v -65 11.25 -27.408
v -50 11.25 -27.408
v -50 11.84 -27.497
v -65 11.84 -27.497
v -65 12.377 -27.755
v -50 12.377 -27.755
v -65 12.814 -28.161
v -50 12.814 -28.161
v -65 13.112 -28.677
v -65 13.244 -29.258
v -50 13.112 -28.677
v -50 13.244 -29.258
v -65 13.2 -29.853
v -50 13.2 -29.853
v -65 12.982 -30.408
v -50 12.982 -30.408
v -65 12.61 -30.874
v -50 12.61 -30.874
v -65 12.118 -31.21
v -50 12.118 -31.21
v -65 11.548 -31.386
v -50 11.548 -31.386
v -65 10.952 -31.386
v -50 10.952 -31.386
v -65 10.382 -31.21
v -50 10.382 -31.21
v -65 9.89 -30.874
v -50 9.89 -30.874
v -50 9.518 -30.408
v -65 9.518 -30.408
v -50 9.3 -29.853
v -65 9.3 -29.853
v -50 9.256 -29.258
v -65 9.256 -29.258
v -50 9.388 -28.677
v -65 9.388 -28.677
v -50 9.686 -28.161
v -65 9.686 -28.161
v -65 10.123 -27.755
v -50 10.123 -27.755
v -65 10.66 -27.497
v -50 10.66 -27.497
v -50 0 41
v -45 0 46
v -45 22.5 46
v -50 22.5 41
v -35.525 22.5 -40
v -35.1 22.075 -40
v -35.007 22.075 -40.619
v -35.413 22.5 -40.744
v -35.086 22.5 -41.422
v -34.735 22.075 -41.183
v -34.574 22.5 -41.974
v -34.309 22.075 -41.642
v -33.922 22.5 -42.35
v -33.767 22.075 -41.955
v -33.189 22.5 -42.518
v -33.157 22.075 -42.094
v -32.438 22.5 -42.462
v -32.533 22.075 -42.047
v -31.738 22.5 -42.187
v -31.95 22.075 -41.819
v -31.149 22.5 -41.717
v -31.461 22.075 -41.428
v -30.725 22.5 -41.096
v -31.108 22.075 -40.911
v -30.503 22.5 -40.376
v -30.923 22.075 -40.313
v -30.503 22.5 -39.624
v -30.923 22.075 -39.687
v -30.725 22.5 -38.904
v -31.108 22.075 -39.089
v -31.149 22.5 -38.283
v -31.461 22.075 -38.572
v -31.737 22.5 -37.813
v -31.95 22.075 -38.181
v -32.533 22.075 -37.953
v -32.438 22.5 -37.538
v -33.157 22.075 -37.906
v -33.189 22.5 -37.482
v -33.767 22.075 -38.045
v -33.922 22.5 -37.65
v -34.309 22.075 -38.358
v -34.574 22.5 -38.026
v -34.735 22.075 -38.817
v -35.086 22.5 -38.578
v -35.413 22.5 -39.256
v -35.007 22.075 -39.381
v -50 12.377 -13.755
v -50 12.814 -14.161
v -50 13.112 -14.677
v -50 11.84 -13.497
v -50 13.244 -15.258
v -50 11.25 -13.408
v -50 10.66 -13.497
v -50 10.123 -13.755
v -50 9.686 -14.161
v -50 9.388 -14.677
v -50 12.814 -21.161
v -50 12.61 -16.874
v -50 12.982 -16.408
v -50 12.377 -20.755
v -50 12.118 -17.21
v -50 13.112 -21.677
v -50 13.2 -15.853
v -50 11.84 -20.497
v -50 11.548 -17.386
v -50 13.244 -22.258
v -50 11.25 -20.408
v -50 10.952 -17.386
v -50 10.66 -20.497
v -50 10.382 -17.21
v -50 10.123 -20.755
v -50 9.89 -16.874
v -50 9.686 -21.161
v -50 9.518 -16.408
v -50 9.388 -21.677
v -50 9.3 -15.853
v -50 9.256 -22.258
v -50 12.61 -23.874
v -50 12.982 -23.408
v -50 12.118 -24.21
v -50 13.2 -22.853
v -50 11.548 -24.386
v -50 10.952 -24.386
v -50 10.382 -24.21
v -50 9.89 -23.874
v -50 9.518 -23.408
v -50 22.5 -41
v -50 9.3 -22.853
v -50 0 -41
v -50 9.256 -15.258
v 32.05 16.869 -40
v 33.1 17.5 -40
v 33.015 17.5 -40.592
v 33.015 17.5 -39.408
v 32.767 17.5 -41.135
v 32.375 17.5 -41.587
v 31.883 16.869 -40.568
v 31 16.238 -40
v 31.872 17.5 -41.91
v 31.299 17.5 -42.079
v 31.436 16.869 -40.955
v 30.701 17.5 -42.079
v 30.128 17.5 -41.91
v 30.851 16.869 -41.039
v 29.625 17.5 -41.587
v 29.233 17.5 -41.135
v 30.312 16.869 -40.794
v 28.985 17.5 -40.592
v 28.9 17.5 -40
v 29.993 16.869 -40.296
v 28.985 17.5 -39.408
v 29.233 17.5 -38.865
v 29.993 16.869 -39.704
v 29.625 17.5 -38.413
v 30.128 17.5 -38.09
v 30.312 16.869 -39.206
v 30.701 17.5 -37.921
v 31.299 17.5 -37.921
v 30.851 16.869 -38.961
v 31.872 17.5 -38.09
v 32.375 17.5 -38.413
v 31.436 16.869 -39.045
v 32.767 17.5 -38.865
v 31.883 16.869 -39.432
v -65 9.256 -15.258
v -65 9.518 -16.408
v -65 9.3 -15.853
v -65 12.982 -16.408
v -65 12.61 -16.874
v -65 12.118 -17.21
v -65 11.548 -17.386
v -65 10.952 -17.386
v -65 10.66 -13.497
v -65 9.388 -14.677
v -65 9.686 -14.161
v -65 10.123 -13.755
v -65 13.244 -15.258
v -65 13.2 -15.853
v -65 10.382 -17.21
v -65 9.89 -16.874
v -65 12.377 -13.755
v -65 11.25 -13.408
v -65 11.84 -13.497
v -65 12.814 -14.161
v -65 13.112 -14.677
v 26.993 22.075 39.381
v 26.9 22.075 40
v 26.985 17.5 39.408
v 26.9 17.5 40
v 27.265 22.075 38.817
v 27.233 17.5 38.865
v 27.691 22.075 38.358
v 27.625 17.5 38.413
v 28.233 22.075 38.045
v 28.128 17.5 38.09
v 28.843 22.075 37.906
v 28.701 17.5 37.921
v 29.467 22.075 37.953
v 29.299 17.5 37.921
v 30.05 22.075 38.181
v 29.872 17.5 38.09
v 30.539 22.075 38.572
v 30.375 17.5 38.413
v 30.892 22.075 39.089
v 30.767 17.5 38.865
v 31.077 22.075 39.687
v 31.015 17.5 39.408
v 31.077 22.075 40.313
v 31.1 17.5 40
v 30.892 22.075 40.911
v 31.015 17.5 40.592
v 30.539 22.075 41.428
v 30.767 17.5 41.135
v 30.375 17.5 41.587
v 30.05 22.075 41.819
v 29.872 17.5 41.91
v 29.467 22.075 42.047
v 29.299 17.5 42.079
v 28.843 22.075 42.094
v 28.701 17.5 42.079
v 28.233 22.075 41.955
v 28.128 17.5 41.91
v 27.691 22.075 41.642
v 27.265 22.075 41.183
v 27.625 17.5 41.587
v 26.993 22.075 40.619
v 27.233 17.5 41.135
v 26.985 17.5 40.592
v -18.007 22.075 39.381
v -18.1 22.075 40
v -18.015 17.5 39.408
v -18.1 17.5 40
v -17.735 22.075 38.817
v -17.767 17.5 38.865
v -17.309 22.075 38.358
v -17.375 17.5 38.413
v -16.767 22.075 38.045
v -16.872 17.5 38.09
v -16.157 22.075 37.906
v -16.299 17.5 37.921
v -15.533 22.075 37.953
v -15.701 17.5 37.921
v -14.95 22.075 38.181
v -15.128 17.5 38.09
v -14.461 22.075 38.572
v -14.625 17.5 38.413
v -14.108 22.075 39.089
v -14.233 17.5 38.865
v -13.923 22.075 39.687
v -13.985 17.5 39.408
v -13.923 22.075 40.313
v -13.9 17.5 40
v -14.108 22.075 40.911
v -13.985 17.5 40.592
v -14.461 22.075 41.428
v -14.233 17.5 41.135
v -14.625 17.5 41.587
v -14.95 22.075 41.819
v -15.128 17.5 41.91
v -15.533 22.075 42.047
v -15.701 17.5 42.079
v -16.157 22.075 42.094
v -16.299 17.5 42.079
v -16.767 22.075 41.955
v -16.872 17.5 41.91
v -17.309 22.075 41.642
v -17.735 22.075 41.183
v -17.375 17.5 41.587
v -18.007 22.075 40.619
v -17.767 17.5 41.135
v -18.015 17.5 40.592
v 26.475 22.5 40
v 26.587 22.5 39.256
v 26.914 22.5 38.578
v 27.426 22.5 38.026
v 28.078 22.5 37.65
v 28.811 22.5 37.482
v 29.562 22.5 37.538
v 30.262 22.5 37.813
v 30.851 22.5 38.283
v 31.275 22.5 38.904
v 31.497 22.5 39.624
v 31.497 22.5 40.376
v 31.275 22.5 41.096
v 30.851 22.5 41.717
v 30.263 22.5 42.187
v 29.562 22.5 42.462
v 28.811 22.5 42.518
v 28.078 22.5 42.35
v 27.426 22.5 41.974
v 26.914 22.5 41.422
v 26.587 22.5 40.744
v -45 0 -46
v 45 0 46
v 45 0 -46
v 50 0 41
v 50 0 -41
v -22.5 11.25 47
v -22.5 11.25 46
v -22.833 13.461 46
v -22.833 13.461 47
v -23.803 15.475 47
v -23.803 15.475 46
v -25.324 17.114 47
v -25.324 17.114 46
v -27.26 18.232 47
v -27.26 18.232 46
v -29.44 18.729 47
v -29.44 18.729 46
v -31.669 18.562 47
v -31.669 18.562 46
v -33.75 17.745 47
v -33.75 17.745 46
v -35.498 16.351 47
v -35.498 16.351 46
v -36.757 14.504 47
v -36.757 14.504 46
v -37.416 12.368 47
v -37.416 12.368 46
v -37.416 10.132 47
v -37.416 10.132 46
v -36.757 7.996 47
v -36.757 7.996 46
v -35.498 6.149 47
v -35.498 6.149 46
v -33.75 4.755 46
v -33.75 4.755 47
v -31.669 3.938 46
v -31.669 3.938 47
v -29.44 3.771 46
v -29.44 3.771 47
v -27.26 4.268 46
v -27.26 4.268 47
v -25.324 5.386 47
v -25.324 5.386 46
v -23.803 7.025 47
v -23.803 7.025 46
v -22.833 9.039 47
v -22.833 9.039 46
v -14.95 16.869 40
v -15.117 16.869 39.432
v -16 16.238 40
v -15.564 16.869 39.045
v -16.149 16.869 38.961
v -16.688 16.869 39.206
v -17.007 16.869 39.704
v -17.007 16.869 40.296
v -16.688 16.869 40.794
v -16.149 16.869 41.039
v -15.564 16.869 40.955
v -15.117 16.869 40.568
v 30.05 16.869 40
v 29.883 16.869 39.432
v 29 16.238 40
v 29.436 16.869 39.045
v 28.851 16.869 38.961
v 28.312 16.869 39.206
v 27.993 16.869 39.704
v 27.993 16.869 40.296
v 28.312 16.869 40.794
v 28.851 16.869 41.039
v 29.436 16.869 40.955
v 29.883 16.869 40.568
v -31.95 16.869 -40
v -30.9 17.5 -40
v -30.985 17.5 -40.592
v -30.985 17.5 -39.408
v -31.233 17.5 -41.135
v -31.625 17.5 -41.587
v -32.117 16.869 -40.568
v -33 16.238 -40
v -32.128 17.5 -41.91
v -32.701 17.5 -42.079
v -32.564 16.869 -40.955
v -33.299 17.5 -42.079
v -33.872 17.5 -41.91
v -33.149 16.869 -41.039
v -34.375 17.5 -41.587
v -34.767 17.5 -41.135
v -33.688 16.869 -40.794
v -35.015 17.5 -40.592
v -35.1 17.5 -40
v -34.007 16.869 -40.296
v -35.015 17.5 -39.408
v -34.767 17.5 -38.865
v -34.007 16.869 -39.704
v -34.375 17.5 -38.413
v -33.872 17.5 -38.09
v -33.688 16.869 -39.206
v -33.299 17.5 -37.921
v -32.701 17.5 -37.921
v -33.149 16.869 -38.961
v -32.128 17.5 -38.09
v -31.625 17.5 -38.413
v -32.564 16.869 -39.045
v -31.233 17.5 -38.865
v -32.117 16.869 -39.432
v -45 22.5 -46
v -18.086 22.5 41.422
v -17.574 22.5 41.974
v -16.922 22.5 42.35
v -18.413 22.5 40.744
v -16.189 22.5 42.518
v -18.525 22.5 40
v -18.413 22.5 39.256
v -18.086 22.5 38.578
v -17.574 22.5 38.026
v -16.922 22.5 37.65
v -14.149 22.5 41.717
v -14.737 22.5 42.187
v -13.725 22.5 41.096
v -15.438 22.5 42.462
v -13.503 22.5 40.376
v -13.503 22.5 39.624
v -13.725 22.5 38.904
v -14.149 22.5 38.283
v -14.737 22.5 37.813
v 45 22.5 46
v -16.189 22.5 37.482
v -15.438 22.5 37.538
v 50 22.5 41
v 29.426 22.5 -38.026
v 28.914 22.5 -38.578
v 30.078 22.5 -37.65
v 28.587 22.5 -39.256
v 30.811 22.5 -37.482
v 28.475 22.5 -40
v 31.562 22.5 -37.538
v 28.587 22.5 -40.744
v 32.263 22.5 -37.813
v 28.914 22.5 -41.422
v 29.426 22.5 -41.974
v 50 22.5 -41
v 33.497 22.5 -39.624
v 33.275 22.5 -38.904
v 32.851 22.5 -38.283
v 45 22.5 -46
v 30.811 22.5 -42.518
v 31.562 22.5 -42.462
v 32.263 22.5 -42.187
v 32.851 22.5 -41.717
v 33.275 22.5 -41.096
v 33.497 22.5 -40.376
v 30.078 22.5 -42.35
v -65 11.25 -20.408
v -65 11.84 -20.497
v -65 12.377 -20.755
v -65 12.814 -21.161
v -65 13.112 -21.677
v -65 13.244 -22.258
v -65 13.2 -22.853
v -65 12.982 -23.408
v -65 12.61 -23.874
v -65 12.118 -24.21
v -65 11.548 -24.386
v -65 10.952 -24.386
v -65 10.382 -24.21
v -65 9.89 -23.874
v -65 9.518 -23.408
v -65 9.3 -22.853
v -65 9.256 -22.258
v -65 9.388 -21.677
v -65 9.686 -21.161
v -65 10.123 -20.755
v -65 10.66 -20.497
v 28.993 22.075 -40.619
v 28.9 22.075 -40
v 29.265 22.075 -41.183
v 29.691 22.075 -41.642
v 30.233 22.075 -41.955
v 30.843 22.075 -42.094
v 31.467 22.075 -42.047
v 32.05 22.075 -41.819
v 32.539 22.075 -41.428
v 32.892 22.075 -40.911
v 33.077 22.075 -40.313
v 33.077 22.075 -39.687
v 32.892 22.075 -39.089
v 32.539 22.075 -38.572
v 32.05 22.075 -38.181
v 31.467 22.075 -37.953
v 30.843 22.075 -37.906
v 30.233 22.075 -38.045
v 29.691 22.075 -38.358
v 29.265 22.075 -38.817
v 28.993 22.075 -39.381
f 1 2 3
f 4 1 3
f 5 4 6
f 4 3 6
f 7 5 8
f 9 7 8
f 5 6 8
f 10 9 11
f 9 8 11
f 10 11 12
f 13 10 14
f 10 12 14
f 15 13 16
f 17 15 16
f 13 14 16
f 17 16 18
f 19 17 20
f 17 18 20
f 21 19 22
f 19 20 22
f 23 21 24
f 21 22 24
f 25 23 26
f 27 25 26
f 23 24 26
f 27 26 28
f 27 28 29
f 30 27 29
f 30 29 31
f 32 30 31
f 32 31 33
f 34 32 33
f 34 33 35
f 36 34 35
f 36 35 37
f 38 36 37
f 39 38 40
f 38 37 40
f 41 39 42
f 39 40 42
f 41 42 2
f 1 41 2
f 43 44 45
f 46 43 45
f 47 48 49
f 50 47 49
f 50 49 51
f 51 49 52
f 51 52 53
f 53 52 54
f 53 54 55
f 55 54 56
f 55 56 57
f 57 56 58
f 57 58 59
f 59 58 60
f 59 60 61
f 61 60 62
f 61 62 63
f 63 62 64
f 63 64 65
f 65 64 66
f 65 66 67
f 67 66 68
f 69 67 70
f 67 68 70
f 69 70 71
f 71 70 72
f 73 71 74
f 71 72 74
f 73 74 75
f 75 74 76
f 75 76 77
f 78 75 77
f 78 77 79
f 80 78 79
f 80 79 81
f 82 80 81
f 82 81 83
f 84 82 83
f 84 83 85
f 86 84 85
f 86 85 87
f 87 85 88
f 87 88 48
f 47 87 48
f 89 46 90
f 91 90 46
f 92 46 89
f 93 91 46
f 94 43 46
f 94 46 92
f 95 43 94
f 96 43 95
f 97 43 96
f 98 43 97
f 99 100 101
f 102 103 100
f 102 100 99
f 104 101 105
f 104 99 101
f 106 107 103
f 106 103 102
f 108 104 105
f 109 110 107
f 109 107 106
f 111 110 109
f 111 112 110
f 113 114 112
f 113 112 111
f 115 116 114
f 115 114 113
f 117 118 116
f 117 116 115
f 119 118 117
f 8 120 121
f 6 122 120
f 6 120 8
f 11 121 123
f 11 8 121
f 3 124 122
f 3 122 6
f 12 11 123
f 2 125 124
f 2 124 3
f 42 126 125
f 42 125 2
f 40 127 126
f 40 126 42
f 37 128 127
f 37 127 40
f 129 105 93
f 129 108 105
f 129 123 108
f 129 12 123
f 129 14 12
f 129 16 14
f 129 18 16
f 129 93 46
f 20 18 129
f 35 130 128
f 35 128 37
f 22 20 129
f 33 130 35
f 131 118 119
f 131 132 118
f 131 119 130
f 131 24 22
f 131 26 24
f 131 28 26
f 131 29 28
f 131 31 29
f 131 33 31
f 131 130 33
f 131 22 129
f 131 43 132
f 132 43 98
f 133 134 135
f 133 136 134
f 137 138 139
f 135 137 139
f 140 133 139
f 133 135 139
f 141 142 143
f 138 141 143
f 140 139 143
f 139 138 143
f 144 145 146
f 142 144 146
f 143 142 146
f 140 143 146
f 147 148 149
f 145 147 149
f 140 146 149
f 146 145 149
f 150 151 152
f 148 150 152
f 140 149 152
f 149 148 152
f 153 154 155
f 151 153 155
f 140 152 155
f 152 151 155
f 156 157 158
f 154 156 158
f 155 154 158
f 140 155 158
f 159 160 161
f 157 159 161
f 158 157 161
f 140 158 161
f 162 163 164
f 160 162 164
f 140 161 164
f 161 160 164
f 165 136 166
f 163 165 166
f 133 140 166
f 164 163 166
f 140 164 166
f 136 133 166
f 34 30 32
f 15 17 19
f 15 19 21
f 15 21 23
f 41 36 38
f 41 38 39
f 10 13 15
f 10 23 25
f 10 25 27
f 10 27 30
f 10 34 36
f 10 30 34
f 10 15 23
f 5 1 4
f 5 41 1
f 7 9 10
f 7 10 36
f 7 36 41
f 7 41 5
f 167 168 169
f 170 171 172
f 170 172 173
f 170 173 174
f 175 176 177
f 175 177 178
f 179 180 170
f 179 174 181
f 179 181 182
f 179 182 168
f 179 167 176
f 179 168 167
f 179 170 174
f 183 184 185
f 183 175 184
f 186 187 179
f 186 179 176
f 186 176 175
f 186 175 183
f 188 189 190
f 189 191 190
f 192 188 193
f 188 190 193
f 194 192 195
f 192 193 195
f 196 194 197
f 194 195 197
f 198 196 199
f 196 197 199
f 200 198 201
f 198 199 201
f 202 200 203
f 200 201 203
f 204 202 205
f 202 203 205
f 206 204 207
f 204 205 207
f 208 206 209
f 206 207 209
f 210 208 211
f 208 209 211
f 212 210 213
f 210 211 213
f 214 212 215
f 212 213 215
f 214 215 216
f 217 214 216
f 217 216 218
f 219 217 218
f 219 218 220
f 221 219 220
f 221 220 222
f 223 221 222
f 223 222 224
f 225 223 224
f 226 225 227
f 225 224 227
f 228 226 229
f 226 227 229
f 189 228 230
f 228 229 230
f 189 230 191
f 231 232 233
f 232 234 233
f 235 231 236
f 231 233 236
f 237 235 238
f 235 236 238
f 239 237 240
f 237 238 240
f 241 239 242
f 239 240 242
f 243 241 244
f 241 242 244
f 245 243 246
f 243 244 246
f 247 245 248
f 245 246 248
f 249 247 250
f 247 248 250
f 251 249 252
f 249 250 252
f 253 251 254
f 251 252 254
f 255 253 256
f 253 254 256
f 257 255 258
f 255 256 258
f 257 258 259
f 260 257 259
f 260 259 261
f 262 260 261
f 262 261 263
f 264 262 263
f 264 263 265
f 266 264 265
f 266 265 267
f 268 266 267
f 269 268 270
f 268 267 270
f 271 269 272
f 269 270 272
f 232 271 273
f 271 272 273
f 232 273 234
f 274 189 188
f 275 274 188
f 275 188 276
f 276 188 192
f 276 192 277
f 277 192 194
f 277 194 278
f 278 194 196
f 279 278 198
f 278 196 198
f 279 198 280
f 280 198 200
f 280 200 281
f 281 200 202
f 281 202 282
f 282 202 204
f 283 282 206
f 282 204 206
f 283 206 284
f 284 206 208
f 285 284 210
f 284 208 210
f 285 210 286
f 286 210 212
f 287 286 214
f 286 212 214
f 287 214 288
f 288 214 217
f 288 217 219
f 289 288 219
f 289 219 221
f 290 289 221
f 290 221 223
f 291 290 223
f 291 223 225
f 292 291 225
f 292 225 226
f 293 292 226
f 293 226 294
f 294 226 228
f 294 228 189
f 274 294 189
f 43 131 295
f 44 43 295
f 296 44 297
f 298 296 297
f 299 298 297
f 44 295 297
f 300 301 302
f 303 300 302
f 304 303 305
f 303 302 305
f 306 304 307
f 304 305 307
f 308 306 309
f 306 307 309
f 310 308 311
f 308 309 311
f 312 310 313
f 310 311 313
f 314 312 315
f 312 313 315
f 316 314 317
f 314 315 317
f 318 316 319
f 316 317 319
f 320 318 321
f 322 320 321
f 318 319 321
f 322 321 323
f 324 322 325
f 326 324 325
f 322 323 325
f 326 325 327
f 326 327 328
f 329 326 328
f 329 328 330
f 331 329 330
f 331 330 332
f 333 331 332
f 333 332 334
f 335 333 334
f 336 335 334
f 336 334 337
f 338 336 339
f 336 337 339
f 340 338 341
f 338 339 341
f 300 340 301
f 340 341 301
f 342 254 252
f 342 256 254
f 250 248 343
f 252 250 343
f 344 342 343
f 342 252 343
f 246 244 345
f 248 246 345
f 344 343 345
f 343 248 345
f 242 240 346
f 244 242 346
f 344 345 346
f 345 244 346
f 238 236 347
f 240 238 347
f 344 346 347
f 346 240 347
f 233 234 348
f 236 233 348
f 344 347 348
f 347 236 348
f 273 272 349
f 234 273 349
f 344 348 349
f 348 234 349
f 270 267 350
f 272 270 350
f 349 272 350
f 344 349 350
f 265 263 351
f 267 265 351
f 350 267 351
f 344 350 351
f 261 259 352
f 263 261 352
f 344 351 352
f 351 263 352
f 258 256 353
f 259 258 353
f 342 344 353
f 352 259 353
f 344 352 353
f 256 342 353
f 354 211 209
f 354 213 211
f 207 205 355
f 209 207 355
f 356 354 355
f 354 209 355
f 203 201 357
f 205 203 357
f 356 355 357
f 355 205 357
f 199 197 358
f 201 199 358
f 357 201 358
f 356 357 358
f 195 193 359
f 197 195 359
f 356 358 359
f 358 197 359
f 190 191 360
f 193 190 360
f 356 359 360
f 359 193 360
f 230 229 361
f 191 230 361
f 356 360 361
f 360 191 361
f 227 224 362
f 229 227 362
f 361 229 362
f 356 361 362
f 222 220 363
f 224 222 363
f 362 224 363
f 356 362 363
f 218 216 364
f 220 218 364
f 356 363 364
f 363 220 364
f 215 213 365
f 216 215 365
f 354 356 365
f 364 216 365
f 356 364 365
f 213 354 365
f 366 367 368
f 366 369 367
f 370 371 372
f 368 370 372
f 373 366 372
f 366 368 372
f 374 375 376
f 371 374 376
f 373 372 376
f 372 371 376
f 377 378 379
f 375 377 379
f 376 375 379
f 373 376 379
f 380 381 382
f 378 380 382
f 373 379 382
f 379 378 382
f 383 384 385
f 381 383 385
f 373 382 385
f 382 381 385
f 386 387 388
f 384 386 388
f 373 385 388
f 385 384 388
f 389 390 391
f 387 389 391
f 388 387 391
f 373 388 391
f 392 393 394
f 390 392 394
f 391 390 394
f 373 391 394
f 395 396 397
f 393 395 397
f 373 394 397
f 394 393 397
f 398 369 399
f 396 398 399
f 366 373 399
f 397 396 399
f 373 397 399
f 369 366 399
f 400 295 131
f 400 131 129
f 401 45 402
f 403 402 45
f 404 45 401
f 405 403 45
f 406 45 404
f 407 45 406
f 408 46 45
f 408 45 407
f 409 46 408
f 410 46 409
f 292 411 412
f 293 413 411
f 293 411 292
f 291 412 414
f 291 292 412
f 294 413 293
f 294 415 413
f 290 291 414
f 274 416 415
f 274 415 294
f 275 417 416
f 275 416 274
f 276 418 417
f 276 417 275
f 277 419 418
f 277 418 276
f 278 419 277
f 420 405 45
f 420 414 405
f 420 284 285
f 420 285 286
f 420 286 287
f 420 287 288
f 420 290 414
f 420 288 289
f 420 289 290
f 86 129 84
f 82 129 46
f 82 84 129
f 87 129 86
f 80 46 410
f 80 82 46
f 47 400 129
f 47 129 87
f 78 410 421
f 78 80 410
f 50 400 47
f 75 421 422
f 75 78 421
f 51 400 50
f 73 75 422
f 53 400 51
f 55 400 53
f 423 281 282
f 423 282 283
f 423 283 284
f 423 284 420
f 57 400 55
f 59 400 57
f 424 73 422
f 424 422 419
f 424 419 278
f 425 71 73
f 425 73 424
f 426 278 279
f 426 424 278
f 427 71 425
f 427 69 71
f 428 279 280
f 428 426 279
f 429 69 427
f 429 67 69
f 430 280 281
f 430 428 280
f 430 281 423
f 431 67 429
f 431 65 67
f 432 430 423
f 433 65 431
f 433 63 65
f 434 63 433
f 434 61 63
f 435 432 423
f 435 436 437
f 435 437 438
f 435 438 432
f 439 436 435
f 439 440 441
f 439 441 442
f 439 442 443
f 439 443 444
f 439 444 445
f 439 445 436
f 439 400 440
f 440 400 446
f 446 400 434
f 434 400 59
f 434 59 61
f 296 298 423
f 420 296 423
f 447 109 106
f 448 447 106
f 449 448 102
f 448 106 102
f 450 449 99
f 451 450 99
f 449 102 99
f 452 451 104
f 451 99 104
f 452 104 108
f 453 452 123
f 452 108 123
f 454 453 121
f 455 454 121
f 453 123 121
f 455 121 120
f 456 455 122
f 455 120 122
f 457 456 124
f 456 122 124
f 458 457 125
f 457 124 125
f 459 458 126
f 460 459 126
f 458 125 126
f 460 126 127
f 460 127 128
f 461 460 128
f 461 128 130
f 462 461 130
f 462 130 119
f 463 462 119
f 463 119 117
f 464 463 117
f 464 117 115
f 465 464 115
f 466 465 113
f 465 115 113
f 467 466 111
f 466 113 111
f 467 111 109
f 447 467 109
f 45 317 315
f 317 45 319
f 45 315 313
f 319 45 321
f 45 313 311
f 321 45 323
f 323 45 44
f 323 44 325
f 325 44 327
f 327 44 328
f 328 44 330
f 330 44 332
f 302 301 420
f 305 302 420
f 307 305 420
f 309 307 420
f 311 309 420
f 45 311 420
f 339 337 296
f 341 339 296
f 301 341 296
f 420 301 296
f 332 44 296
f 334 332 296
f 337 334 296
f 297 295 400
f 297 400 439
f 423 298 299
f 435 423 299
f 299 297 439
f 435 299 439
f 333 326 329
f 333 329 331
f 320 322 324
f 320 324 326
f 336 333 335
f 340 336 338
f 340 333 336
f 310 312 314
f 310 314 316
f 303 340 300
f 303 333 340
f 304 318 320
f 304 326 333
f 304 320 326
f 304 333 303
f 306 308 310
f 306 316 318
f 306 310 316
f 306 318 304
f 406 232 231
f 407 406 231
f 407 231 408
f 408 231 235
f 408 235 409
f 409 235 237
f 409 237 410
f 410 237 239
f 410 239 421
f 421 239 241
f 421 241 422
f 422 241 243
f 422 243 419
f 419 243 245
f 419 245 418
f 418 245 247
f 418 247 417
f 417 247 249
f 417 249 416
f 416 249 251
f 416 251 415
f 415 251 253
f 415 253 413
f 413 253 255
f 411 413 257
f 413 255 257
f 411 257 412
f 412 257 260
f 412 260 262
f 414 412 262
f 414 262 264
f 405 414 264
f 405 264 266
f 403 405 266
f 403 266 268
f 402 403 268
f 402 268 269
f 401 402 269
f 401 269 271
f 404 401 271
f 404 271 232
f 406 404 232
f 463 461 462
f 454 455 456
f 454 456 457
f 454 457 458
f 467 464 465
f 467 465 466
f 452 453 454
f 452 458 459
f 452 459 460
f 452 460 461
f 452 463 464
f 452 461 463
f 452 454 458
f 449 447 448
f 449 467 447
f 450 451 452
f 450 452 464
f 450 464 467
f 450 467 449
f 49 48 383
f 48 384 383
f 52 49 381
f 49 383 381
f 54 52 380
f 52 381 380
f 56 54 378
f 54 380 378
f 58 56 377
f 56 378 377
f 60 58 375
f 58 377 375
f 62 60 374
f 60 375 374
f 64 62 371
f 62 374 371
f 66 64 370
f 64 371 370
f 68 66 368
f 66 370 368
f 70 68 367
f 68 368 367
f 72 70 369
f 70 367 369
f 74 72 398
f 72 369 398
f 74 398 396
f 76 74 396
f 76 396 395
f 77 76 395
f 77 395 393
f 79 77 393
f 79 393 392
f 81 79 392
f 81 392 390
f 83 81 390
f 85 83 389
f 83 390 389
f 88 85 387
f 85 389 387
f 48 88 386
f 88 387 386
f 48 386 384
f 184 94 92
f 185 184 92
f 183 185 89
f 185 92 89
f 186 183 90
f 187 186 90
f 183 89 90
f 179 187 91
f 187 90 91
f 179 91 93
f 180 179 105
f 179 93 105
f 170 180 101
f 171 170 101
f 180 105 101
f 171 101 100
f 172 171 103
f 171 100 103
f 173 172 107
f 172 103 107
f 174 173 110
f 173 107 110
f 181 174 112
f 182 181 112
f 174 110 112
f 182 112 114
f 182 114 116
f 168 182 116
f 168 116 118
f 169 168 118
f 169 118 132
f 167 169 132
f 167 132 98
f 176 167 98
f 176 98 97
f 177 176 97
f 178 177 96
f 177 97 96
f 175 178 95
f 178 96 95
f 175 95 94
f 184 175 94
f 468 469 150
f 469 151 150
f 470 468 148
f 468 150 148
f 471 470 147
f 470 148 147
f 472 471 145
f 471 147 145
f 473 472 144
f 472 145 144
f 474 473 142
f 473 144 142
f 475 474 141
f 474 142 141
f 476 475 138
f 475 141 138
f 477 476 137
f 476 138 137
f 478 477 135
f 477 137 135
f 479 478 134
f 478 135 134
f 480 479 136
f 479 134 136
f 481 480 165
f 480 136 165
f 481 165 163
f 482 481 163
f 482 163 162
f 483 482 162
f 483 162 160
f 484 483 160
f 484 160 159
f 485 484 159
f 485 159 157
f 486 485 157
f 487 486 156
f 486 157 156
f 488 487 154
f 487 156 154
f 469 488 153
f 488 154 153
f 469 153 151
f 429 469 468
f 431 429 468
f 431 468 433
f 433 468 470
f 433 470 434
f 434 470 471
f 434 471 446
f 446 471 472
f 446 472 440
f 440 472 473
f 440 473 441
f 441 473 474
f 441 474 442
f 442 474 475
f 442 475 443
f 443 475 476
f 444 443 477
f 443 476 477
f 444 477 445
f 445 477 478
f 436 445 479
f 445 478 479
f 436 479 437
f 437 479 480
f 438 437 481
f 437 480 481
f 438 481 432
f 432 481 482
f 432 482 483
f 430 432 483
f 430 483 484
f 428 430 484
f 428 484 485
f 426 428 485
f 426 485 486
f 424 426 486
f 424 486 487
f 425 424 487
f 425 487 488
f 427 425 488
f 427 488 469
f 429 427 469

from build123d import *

# Parameters (mm, degrees)
SKETCH1_W                   = 100
SKETCH1_H                   = 92
BOSS_EXTRUDE1_DEPTH         = 22.5
CHAMFER1_SIZE               = 5
SKETCH3_R                   = 7.5
BOSS_EXTRUDE2_DEPTH         = 1
M5_TAPPED_HOLE1_D           = 4.2
M5_TAPPED_HOLE1_DEPTH       = 5
M5_TAPPED_HOLE1_CSINK_D     = 5.05
M5_TAPPED_HOLE1_CSINK_ANGLE = 90
M5_TAPPED_HOLE1_TIP         = 1.2618073
SKETCH8_R                   = 2
BOSS_EXTRUDE3_DEPTH         = 15


with BuildPart() as part:
    # Sketch1 → Boss-Extrude1 (new body)
    with BuildSketch(Plane(origin=(0, 0, 0), x_dir=(1, 0, 0), z_dir=(0, 1, 0))):
        Rectangle(SKETCH1_W, SKETCH1_H)
    extrude(amount=BOSS_EXTRUDE1_DEPTH)

    # Chamfer1
    chamfer1_edges = [part.edges().sort_by_distance(p)[0] for p in [
        (50, 11.25, 46),
        (-50, 11.25, 46),
        (-50, 11.25, -46),
        (50, 11.25, -46),
    ]]
    chamfer(chamfer1_edges, length=CHAMFER1_SIZE)

    # Sketch3 → Boss-Extrude2 (add)
    with BuildSketch(Plane.XY.offset(46)):
        with Locations((-30, 11.25)):
            Circle(SKETCH3_R)
    extrude(amount=BOSS_EXTRUDE2_DEPTH)

    # M5 Tapped Hole1
    with Locations(Plane(origin=(0, 22.5, 0), x_dir=(1, 0, 0), z_dir=(0, 1, 0))):
        with Locations((-33, 40), (31, 40), (29, -40), (-16, -40)):
            CounterSinkHole(M5_TAPPED_HOLE1_D / 2, M5_TAPPED_HOLE1_CSINK_D / 2, depth=M5_TAPPED_HOLE1_DEPTH, counter_sink_angle=M5_TAPPED_HOLE1_CSINK_ANGLE)
            with Locations((0, 0, -(M5_TAPPED_HOLE1_DEPTH + M5_TAPPED_HOLE1_TIP / 2))):  # 118° drill point
                Cone(0, M5_TAPPED_HOLE1_D / 2, M5_TAPPED_HOLE1_TIP, mode=Mode.SUBTRACT)

    # Sketch8 → Boss-Extrude3 (add)
    with BuildSketch(Plane.ZY.offset(50)):
        with Locations((-29.407923946, 11.25)):
            Circle(SKETCH8_R)
        with Locations((-22.407923946, 11.25)):
            Circle(SKETCH8_R)
        with Locations((-15.407923946, 11.25)):
            Circle(SKETCH8_R)
    extrude(amount=BOSS_EXTRUDE3_DEPTH)


solid = part.part
